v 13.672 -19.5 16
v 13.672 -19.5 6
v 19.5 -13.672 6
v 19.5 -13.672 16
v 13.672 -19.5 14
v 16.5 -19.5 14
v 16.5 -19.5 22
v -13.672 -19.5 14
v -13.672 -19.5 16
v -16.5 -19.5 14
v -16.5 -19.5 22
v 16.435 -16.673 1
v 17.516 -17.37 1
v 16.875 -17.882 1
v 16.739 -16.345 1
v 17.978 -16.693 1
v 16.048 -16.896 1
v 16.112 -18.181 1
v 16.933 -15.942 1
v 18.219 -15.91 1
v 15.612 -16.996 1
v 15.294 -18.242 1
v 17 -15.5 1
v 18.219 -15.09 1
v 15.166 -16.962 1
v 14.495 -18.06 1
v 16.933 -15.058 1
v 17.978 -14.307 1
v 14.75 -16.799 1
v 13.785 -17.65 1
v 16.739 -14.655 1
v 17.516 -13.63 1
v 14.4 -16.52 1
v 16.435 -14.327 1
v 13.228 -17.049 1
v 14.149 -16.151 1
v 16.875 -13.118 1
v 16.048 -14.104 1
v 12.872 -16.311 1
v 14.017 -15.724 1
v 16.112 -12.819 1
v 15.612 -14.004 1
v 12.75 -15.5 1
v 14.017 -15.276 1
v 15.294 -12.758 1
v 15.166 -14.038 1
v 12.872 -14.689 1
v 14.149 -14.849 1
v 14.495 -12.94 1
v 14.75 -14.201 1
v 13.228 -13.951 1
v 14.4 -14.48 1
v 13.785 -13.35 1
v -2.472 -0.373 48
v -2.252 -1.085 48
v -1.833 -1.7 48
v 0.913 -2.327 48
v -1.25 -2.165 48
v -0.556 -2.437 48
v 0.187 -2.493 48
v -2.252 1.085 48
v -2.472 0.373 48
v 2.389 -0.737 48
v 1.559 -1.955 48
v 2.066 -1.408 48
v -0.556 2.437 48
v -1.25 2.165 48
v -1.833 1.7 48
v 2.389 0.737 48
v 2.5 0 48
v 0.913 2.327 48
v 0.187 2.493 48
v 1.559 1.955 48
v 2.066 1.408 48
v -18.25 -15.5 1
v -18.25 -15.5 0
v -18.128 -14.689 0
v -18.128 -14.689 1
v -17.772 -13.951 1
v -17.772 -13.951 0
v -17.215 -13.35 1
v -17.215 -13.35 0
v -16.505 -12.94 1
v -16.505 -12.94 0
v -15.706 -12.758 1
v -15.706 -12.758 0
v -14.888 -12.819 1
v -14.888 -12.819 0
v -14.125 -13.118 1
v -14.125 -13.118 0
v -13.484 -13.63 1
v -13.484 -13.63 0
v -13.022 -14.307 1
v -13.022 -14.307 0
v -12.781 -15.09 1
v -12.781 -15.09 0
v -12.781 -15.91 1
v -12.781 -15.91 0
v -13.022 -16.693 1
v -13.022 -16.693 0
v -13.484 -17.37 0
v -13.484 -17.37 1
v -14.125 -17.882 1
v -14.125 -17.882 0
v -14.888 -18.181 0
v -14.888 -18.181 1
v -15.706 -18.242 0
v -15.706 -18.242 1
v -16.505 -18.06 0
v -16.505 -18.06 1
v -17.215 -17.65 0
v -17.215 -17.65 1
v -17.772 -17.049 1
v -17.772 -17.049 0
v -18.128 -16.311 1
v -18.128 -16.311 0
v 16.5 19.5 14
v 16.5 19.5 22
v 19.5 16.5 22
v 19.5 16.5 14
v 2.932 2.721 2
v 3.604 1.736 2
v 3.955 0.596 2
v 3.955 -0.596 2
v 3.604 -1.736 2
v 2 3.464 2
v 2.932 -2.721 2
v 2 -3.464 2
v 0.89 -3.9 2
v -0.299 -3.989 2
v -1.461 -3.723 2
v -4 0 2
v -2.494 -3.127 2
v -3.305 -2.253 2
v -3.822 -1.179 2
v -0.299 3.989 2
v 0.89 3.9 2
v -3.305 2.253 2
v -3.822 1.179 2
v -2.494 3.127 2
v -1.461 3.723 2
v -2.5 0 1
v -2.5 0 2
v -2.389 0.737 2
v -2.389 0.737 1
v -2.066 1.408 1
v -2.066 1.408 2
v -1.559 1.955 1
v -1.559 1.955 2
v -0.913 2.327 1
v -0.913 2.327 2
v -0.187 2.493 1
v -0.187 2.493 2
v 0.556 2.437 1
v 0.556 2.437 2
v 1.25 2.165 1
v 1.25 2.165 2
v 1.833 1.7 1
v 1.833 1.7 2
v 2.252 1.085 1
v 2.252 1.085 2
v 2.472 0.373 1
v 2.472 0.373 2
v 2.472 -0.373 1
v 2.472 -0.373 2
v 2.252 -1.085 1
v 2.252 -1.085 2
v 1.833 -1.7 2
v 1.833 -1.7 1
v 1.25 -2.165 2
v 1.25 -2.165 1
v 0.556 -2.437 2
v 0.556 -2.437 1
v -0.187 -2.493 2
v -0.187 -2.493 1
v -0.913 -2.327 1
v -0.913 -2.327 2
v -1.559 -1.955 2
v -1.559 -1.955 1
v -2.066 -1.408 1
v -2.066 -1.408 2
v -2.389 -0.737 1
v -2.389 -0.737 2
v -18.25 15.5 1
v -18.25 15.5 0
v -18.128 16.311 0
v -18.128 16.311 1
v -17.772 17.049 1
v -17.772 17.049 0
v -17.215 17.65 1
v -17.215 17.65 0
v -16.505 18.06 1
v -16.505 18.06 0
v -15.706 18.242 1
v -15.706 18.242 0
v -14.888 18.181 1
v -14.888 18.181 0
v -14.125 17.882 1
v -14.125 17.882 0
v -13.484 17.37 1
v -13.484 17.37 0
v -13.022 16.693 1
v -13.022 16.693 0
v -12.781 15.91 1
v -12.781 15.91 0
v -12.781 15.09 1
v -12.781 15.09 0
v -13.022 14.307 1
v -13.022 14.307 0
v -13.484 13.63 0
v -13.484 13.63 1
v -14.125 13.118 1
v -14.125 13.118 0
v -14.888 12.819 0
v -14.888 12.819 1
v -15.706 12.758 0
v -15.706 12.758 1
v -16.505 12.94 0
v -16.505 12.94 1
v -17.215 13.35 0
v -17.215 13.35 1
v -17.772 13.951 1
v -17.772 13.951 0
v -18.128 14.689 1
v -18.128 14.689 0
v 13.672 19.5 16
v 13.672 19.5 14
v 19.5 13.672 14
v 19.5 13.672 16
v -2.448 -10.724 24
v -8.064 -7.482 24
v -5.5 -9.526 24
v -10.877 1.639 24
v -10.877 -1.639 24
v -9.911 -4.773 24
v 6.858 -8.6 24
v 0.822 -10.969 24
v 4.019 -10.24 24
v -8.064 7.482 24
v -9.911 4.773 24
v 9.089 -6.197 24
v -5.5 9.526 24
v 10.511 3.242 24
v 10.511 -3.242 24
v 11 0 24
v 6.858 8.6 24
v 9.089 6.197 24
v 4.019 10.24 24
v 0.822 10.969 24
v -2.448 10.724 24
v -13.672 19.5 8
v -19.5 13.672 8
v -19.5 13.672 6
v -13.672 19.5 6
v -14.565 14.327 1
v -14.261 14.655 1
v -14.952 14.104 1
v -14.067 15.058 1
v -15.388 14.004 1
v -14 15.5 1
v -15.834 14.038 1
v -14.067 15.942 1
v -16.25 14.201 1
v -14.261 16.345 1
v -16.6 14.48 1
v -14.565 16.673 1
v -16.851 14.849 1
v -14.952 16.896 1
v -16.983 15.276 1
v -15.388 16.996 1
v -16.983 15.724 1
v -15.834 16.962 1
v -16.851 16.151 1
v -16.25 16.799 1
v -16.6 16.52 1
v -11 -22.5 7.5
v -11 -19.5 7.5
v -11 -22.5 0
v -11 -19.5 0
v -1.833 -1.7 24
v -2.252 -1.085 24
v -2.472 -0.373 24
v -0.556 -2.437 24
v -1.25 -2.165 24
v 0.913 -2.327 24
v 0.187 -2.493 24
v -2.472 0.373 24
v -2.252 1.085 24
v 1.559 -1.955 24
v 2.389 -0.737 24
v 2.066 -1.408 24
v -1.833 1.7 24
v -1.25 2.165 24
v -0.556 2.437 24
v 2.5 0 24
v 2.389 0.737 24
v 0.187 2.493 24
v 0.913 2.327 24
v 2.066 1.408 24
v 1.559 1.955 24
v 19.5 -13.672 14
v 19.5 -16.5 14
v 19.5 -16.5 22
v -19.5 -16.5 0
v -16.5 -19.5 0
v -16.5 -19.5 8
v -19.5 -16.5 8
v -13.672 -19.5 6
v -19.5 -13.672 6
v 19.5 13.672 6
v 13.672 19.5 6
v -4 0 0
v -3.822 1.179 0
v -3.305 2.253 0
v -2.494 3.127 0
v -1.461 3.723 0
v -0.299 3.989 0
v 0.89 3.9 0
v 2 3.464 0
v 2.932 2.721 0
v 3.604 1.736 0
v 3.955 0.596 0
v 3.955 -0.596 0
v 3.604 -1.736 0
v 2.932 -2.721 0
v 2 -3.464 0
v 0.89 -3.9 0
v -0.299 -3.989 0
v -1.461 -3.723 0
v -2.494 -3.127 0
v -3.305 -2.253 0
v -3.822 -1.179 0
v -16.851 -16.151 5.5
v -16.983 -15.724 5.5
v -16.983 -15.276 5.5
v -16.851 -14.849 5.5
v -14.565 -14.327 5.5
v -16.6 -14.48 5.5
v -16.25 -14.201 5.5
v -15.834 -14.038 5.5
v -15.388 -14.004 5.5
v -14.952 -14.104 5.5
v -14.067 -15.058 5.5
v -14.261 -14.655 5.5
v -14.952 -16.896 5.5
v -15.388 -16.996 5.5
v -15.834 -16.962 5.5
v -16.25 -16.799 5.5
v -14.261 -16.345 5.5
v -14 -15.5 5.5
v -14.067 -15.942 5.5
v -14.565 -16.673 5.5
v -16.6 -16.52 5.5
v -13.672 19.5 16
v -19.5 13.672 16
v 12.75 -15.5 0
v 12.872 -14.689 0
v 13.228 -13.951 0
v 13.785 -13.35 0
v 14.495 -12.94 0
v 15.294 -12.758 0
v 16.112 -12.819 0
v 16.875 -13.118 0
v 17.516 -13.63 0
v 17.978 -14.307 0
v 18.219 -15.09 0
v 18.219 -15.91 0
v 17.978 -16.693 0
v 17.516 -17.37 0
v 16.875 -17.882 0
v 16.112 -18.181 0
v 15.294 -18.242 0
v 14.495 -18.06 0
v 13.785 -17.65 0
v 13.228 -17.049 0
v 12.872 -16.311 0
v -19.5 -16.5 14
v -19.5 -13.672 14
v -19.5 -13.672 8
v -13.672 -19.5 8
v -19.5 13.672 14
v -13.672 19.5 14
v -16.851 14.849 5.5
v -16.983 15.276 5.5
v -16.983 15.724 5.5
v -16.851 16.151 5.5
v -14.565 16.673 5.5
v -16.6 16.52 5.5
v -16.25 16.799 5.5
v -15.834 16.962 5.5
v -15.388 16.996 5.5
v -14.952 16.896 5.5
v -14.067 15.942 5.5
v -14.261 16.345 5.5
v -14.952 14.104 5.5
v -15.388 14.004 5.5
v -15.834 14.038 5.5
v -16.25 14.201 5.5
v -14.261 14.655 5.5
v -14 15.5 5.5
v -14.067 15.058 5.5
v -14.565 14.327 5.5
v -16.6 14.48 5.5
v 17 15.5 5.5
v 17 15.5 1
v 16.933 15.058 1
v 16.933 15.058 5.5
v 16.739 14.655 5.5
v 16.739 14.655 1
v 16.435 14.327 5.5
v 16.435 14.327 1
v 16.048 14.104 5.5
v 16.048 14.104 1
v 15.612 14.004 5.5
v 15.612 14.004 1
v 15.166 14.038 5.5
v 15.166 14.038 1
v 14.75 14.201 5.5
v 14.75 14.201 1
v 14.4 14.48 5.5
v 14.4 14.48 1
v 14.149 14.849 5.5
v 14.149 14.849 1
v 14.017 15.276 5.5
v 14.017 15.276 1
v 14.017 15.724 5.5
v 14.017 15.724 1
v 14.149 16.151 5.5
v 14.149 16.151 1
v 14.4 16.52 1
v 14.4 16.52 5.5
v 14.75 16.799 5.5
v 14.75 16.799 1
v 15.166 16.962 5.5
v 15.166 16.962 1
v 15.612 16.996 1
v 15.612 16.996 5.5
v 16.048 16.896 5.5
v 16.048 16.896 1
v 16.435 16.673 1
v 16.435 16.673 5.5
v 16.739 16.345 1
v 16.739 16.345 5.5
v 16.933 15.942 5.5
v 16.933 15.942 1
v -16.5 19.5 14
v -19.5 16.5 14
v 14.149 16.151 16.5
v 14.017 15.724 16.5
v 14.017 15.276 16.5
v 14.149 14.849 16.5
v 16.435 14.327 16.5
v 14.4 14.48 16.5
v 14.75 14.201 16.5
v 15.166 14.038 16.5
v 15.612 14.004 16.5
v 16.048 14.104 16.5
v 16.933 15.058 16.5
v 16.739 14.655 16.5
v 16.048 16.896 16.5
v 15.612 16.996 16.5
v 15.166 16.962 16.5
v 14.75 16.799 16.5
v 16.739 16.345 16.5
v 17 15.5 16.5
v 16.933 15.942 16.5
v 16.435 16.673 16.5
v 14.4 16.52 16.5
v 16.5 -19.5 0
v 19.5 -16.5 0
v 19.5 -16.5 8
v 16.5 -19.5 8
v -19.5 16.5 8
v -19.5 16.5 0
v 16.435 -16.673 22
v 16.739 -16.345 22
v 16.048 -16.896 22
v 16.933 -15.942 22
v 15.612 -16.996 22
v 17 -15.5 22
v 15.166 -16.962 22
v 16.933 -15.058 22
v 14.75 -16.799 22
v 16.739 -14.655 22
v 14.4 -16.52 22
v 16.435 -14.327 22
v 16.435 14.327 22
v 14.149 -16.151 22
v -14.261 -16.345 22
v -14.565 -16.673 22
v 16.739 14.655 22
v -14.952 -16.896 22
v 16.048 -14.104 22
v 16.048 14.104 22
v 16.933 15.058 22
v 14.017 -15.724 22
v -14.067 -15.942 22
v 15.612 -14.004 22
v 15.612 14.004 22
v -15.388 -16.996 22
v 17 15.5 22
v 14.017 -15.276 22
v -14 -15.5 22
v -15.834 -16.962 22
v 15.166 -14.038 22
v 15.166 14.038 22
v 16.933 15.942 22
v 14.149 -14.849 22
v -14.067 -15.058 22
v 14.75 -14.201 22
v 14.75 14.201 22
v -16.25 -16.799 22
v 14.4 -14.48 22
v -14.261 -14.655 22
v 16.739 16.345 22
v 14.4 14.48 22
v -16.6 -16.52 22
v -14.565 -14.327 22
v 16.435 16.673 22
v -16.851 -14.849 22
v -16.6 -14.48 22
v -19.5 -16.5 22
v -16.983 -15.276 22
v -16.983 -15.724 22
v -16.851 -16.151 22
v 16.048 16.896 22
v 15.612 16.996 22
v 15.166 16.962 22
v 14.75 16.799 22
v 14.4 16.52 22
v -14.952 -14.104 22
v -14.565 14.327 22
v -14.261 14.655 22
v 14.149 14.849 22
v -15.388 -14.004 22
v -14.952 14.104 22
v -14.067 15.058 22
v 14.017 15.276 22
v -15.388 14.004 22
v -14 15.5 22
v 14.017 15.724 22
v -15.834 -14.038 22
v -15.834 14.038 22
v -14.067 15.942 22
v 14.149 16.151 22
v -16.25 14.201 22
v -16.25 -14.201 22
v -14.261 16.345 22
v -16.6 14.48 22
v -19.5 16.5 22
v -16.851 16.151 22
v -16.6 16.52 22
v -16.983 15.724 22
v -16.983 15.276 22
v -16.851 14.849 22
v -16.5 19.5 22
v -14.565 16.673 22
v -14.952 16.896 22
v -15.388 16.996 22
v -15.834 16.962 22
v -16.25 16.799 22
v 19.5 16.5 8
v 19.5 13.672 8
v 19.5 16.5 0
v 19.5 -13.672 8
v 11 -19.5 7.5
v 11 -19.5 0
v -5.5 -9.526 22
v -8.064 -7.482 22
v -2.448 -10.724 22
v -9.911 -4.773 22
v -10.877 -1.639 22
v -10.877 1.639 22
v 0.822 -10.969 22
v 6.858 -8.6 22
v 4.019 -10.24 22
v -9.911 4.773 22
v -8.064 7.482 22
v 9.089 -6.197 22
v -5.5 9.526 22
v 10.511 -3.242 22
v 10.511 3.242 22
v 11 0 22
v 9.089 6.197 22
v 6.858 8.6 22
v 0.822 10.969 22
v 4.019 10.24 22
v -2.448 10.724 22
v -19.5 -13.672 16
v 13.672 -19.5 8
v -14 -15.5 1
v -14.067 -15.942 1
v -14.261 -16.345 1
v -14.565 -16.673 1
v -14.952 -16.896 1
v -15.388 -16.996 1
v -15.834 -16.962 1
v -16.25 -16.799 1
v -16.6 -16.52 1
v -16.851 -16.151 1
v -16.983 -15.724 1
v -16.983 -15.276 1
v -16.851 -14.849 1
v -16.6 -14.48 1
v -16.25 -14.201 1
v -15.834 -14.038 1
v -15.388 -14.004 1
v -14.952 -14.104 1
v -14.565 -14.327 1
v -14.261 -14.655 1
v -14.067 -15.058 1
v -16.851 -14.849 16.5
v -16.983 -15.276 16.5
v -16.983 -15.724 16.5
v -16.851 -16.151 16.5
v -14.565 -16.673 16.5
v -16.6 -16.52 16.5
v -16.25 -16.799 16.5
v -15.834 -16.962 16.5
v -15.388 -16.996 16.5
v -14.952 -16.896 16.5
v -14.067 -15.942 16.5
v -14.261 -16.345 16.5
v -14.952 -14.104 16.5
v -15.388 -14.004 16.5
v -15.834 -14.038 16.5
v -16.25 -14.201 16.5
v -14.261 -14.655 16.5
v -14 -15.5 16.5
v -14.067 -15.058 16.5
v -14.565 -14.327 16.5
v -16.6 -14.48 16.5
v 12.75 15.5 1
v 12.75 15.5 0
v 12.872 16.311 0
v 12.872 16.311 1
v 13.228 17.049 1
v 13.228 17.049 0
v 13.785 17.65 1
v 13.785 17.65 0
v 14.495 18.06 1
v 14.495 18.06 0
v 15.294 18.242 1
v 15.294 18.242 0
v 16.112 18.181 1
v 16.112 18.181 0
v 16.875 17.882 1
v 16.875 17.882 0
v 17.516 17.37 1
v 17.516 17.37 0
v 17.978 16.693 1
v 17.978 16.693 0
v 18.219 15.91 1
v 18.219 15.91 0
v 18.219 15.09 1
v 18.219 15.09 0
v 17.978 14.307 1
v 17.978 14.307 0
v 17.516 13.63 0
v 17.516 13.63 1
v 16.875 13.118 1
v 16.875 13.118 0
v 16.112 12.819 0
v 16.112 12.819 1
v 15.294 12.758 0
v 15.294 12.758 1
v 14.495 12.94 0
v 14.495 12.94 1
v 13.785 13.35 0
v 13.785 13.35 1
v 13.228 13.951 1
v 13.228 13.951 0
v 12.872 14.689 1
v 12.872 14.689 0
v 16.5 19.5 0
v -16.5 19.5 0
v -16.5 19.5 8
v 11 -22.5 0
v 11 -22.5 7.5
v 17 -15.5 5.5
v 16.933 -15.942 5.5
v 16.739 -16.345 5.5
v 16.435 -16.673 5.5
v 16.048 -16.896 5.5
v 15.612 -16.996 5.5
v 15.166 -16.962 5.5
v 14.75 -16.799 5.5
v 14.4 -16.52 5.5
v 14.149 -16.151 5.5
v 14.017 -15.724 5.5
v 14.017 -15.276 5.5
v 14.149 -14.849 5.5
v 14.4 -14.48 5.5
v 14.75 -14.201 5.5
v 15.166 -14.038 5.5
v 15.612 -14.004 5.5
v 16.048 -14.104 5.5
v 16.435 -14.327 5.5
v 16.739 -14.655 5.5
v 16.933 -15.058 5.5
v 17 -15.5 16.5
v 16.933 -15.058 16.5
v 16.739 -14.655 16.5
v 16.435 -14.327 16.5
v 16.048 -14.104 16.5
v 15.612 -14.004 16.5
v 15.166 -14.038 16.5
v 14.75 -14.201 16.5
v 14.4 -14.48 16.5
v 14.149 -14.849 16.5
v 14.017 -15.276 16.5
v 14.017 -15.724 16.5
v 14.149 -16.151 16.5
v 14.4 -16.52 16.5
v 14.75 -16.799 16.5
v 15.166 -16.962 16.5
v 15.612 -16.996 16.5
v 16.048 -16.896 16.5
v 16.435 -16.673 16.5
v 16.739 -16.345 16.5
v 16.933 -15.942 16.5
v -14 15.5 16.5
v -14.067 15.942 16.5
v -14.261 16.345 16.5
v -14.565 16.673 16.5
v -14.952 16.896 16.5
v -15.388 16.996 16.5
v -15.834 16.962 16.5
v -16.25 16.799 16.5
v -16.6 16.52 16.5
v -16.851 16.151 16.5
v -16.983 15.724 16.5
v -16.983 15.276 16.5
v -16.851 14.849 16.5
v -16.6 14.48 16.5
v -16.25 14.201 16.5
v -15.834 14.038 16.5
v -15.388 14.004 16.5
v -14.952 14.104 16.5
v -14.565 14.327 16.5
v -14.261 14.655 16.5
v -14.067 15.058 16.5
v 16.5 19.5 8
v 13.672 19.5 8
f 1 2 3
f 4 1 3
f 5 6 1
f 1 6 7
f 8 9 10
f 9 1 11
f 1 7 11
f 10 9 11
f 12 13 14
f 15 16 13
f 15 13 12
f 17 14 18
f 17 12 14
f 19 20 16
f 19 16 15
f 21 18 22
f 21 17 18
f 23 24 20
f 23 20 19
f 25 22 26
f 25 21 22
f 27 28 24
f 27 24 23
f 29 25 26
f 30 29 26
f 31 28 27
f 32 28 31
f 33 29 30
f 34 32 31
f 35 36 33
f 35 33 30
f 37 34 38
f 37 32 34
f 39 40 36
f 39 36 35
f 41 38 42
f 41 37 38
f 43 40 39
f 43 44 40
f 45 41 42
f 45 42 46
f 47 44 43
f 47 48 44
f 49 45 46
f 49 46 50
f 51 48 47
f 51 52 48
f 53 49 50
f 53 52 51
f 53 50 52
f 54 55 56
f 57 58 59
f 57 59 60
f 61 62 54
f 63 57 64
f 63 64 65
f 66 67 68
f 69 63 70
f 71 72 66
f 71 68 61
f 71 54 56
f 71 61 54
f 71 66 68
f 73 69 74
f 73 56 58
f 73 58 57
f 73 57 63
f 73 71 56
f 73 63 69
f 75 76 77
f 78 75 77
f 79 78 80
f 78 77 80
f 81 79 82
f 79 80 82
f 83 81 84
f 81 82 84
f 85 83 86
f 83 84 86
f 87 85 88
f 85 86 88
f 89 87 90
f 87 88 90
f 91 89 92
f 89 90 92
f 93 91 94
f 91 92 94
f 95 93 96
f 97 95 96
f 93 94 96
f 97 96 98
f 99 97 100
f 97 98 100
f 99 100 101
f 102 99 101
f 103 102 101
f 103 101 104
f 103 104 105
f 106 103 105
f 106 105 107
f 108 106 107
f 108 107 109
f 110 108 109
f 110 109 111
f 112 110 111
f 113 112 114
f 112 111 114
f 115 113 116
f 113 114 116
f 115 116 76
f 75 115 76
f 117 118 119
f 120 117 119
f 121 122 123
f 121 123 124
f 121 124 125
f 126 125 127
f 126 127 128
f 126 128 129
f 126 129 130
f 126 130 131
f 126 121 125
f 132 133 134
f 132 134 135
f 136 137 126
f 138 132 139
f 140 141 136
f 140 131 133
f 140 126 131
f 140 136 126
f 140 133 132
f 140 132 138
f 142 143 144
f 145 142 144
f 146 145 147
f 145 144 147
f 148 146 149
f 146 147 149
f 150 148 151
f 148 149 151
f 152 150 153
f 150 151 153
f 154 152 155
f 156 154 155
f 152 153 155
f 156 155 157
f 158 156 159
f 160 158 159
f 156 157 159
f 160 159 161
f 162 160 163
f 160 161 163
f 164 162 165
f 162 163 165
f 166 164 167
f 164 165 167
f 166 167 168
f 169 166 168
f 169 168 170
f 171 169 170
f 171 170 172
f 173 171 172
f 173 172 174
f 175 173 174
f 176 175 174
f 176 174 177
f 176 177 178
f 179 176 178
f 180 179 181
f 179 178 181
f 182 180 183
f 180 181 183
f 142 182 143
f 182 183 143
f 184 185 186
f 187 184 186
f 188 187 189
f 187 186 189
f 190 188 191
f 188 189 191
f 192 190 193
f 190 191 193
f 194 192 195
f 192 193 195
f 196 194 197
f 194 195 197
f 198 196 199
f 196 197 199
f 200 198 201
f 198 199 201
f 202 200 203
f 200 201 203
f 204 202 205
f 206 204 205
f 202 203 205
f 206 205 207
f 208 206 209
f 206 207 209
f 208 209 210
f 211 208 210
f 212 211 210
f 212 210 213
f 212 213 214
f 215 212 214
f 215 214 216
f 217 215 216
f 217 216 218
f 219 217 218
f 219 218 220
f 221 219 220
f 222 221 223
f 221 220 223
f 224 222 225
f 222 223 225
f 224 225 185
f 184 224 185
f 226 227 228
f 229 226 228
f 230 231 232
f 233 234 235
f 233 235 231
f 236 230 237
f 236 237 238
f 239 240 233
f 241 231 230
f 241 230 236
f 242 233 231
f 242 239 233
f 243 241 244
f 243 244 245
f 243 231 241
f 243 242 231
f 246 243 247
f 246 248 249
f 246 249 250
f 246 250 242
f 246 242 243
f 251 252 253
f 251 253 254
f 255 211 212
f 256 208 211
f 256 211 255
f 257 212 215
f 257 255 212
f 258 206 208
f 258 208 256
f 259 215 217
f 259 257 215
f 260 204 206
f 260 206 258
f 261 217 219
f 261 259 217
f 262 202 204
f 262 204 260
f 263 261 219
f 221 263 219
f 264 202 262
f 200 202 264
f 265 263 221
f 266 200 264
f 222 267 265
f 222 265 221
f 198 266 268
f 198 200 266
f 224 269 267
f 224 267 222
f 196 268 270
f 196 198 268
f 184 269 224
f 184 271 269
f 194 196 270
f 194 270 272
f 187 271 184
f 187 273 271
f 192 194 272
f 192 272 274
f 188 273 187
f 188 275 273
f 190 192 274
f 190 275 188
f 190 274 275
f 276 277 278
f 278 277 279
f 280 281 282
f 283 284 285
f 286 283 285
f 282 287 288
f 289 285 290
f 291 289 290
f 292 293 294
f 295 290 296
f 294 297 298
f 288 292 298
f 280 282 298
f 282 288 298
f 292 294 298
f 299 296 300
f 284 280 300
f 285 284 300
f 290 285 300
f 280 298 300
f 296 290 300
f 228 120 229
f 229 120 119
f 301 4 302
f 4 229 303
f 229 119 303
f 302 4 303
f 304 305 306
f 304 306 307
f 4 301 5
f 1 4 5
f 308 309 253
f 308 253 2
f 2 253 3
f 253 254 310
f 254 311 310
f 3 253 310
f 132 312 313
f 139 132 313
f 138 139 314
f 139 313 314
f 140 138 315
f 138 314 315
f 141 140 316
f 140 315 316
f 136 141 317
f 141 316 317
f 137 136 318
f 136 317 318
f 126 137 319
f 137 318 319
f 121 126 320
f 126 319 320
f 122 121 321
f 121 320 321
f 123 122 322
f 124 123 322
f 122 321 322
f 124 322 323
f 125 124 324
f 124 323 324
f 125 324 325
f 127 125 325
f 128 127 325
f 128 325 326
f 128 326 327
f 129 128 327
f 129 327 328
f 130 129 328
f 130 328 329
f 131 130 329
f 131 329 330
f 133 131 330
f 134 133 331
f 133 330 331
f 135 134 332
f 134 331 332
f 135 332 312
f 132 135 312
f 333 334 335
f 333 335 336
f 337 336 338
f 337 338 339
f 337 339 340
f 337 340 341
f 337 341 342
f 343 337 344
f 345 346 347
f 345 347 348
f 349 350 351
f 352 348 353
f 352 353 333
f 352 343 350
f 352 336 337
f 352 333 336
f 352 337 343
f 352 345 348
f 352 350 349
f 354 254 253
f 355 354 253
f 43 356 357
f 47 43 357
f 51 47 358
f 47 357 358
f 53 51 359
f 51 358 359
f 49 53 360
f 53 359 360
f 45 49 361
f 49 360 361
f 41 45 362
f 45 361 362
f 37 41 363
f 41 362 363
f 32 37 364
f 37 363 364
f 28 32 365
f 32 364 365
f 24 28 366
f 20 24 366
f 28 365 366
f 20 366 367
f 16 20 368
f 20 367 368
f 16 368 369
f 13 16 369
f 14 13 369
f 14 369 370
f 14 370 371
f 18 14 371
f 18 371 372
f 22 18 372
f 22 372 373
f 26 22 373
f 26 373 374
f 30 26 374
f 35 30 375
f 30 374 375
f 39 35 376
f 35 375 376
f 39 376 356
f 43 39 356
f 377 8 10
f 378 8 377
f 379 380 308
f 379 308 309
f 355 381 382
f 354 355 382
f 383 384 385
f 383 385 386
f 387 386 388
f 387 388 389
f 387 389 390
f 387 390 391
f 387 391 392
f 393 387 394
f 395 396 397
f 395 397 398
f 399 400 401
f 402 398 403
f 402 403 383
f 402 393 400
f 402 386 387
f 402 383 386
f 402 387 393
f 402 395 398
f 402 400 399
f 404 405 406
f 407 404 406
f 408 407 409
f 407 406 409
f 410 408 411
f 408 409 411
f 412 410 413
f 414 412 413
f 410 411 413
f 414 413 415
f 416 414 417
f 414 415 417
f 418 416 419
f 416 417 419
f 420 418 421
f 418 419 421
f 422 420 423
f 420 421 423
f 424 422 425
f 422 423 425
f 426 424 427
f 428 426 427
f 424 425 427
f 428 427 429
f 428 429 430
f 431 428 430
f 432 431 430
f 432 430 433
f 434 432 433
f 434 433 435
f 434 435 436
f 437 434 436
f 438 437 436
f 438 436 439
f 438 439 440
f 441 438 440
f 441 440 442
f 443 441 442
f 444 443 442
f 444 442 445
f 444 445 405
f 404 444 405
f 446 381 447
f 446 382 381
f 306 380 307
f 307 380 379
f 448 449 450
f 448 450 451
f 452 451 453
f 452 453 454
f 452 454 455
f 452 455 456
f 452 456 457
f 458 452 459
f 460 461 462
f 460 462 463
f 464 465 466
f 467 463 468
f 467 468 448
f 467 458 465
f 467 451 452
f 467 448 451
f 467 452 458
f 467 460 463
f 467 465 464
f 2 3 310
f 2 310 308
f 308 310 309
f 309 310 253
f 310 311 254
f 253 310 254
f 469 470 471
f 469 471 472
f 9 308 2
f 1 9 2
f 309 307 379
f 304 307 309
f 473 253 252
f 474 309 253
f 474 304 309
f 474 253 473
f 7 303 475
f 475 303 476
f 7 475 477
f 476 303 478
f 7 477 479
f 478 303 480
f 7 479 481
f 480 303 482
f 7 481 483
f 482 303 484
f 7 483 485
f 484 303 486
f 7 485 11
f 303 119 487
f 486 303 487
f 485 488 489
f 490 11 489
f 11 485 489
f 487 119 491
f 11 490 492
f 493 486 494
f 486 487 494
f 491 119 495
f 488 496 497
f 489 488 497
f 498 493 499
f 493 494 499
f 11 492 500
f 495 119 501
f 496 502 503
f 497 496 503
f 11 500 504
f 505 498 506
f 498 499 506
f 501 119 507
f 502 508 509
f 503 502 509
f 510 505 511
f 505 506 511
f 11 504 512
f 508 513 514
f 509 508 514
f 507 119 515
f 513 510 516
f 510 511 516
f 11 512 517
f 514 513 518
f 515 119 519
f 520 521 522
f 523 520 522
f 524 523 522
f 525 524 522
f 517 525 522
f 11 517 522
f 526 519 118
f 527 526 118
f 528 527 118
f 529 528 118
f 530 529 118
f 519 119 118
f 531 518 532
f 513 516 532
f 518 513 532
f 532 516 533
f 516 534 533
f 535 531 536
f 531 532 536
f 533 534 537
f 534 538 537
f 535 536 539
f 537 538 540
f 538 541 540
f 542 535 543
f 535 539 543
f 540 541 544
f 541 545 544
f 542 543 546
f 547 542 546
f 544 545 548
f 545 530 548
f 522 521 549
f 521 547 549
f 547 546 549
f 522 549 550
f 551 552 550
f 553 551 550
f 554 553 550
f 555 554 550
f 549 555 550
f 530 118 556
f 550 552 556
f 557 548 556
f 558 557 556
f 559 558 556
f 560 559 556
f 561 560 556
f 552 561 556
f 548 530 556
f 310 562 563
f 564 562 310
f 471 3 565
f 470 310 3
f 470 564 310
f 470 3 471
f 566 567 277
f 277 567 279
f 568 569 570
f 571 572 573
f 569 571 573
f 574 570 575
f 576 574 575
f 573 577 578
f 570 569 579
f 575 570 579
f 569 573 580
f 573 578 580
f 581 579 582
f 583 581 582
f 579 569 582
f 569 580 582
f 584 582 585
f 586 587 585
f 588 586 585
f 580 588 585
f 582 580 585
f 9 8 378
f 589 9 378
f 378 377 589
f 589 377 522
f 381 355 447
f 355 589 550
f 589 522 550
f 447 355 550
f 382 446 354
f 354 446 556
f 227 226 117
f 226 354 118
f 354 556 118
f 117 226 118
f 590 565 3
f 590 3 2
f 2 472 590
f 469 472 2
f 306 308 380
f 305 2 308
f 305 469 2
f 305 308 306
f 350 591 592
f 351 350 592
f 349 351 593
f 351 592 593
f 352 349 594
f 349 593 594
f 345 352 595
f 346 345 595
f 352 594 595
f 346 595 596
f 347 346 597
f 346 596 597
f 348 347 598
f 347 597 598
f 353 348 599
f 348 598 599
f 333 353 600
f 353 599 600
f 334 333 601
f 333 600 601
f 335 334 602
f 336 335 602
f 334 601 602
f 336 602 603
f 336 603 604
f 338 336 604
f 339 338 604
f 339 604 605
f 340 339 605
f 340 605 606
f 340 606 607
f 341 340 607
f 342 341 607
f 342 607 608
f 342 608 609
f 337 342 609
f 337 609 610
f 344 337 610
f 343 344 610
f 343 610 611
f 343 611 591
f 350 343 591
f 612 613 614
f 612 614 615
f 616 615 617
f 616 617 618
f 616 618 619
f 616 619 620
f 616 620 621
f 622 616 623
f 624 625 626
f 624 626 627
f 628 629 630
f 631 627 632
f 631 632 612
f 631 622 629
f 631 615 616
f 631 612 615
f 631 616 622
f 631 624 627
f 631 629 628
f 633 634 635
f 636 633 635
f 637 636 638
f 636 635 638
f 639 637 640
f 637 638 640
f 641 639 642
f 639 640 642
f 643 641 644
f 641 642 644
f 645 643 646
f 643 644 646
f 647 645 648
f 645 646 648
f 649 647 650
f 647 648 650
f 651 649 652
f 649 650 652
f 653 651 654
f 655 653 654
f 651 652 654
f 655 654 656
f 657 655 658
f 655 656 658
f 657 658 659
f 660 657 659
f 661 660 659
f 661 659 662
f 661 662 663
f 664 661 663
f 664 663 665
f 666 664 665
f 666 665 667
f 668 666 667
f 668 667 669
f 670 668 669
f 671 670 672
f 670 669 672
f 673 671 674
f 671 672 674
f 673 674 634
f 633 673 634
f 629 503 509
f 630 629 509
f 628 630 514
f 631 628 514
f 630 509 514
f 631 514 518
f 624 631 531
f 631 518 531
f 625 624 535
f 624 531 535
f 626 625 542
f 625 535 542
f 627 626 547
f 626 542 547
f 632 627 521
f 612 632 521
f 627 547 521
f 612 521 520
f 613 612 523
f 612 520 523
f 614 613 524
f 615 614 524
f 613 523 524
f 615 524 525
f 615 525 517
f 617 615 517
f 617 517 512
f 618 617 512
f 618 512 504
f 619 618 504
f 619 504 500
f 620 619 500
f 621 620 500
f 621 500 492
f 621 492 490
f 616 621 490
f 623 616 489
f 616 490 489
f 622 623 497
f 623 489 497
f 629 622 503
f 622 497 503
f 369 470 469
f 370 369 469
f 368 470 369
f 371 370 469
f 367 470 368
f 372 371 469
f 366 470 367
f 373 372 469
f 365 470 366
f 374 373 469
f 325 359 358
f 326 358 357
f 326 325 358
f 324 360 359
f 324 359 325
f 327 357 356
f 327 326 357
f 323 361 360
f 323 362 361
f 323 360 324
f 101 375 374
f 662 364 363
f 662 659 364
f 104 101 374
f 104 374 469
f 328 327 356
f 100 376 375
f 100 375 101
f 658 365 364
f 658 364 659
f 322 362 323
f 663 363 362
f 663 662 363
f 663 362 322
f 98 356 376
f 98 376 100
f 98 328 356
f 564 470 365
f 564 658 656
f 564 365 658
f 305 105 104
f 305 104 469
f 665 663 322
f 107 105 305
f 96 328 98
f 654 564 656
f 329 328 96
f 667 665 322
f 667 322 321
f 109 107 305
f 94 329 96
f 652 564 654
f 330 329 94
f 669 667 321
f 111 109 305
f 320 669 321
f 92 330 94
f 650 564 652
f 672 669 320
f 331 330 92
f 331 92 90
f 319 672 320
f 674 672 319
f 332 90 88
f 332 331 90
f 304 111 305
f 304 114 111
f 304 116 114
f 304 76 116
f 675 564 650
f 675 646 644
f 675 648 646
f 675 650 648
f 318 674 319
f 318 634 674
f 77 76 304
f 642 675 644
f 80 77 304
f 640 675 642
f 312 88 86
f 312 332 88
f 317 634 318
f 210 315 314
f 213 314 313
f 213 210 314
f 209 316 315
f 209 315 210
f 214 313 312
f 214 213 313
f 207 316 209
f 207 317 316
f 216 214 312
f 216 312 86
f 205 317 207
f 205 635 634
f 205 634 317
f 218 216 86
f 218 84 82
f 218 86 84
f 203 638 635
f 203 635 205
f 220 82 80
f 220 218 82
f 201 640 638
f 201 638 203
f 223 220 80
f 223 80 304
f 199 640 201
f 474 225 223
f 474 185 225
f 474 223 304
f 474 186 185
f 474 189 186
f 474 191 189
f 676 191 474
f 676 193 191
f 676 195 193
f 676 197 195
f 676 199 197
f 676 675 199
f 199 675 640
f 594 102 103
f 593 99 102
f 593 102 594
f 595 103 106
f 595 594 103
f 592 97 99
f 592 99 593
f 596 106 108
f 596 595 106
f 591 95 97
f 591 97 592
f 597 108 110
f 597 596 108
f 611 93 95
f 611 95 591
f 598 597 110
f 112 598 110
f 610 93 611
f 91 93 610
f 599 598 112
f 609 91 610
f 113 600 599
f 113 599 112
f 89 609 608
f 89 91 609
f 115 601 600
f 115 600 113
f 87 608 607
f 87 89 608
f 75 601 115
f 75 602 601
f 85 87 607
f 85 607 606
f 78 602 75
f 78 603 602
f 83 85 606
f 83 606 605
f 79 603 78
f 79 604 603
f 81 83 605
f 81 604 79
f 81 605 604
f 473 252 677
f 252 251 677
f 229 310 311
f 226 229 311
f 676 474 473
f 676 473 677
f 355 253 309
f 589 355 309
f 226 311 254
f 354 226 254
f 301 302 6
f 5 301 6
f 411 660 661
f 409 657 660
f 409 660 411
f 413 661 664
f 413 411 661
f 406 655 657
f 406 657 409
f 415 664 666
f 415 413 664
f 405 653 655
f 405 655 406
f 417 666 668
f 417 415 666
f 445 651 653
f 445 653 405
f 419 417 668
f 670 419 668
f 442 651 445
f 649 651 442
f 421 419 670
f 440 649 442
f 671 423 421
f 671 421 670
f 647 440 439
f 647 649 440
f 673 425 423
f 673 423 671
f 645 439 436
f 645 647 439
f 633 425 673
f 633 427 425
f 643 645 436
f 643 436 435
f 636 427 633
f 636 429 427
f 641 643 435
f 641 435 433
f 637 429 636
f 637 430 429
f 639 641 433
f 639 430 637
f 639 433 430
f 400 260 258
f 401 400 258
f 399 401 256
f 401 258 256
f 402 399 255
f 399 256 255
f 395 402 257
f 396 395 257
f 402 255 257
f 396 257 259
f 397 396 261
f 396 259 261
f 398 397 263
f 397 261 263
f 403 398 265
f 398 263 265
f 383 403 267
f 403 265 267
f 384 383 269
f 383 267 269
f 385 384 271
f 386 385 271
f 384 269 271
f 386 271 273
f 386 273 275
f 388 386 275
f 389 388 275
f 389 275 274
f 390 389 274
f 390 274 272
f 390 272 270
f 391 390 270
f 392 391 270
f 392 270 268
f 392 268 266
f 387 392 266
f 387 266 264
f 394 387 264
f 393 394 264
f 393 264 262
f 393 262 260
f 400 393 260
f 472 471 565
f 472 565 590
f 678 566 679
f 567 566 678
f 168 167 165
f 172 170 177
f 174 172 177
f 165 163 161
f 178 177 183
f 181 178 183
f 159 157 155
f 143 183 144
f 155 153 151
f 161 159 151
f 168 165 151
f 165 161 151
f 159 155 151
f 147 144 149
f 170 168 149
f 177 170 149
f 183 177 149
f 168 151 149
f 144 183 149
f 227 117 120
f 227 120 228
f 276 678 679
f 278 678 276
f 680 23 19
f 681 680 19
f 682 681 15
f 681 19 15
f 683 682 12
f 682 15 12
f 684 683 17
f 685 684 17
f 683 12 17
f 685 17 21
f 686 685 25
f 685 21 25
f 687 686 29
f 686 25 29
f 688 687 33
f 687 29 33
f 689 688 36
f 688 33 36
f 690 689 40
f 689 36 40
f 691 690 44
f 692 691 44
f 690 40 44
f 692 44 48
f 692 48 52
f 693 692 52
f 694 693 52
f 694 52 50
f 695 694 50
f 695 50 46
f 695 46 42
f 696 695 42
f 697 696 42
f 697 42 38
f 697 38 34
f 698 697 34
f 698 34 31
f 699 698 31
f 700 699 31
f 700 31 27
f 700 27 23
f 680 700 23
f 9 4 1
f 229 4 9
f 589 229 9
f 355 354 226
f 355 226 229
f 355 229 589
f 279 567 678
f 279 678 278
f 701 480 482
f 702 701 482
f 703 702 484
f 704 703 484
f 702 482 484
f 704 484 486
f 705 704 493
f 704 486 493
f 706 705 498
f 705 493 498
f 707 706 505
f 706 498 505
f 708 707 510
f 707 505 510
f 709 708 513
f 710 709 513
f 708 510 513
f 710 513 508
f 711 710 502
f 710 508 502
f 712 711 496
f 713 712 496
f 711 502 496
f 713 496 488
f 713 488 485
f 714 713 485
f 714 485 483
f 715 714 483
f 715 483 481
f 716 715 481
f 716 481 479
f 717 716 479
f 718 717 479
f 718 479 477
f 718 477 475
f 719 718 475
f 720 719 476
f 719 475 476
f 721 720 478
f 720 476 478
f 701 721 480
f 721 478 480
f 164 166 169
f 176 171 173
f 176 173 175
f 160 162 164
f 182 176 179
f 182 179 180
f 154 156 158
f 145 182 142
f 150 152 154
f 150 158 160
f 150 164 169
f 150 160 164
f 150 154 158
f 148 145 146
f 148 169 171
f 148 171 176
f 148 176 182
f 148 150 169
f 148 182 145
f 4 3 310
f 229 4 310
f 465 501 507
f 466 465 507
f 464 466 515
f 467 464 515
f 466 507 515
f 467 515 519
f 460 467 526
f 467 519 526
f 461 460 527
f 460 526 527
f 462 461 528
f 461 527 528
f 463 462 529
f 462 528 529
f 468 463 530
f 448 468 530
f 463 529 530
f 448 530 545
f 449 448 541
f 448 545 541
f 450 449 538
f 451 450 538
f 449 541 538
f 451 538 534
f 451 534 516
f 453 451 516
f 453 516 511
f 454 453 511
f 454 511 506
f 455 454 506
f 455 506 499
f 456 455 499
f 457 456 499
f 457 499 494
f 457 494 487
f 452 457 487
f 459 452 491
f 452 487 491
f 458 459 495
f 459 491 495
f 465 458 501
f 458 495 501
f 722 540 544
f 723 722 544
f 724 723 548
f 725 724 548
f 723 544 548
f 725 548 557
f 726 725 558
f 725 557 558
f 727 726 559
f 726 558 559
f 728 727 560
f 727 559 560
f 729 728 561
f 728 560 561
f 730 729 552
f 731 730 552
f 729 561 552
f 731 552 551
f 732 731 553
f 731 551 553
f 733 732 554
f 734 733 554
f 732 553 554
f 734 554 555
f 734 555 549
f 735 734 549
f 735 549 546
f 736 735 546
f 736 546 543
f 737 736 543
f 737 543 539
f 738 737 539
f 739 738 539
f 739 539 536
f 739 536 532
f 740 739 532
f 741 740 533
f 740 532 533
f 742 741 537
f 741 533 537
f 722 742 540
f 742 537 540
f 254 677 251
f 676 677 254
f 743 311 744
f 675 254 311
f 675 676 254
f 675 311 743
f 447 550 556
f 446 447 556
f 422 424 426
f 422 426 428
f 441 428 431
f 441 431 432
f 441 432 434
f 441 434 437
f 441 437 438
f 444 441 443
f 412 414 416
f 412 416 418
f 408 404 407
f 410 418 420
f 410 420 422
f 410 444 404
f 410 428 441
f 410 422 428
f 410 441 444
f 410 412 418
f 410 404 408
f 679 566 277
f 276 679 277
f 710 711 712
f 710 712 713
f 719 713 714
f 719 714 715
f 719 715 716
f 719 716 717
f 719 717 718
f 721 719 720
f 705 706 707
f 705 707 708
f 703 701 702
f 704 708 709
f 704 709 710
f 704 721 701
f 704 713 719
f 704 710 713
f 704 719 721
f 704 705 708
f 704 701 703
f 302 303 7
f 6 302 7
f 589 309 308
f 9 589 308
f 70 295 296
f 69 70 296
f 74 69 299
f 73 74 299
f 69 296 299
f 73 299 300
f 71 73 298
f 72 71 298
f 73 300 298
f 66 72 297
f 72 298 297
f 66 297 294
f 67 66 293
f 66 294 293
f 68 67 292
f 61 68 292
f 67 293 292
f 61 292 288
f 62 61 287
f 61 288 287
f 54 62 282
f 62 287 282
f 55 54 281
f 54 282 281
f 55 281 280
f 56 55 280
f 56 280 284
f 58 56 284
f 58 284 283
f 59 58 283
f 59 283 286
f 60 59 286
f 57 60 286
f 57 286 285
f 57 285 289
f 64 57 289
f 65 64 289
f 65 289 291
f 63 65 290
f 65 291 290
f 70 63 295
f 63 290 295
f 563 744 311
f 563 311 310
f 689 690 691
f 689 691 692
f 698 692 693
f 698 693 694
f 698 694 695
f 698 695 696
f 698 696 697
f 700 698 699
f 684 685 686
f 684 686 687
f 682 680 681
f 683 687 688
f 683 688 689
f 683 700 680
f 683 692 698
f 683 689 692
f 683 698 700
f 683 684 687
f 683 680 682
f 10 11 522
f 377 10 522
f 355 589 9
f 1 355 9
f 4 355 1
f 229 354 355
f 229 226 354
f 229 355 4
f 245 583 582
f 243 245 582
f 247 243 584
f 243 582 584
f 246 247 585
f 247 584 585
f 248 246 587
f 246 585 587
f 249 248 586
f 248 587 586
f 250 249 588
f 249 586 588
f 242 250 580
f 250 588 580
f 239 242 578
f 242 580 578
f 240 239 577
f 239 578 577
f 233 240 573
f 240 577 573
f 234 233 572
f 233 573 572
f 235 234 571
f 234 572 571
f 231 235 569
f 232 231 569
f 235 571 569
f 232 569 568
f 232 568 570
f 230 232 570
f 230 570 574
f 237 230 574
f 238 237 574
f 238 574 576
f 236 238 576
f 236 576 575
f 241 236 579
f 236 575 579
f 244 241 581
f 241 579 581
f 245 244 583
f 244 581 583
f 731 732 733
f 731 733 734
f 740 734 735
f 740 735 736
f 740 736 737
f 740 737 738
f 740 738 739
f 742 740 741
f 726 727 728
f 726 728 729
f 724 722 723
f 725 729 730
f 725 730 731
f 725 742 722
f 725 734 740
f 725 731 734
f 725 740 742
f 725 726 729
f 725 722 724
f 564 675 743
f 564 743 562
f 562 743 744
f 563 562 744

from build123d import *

# Parameters (mm, degrees)
BOSS_EXTRUDE1_DEPTH  = 8
CUT_EXTRUDE1_DEPTH   = 2
BOSS_EXTRUDE7_DEPTH  = 8
EXTRUDE_3_DEPTH      = 10
CUT_EXTRUDE2_DEPTH   = 2
SKETCH10_R           = 1.5
CUT_EXTRUDE3_DEPTH   = 5.5
SKETCH11_R           = 11
BOSS_EXTRUDE9_DEPTH  = 2
SKETCH12_R           = 2.5
BOSS_EXTRUDE10_DEPTH = 24
SKETCH14_R           = 1.5
CUT_EXTRUDE5_DEPTH   = 5.5
SKETCH16_R           = 4
CUT_EXTRUDE6_DEPTH   = 2
SKETCH17_R           = 2.5
BOSS_EXTRUDE11_DEPTH = 1
SKETCH18_R           = 2.75
CUT_EXTRUDE7_DEPTH   = 1
SKETCH_3_W           = 22
SKETCH_3_H           = 7.5
EXTRUDE_4_DEPTH      = 3


with BuildPart() as part:
    # Sketch1 → Boss-Extrude1 (new body)
    with BuildSketch(Plane.XY):
        Polygon((-19.5, 16.5), (-16.5, 19.5), (16.5, 19.5), (19.5, 16.5), (19.5, -16.5), (16.5, -19.5), (-16.5, -19.5), (-19.5, -16.5), align=None)
    extrude(amount=BOSS_EXTRUDE1_DEPTH)

    # Sketch2 → Cut-Extrude1 (cut)
    with BuildSketch(Plane.XY.offset(8)):
        Polygon((-19.5, 13.671572875), (-13.671572875, 19.5), (13.671572875, 19.5), (19.5, 13.671572875), (19.5, -13.671572875), (13.671572875, -19.5), (-13.671572875, -19.5), (-19.5, -13.671572875), align=None)
    extrude(amount=-CUT_EXTRUDE1_DEPTH, mode=Mode.SUBTRACT)

    # Sketch14 → Cut-Extrude5 (cut)
    with BuildSketch(Plane(origin=(0, 0, 0), x_dir=(-1, 0, 0), z_dir=(0, 0, -1))):
        with Locations(Location((15.5, -15.5, 0), (0, 0, 180))):
            Circle(SKETCH14_R)
        with Locations(Location((-15.5, -15.5, 0), (0, 0, 180))):
            Circle(SKETCH14_R)
        with Locations(Location((-15.5, 15.5, 0), (0, 0, 180))):
            Circle(SKETCH14_R)
        with Locations(Location((15.5, 15.5, 0), (0, 0, 180))):
            Circle(SKETCH14_R)
    extrude(amount=-CUT_EXTRUDE5_DEPTH, mode=Mode.SUBTRACT)

    # Sketch16 → Cut-Extrude6 (cut)
    with BuildSketch(Plane(origin=(0, 0, 0), x_dir=(-1, 0, 0), z_dir=(0, 0, -1))):
        Circle(SKETCH16_R)
    extrude(amount=-CUT_EXTRUDE6_DEPTH, mode=Mode.SUBTRACT)

    # Sketch18 → Cut-Extrude7 (cut)
    with BuildSketch(Plane(origin=(0, 0, 0), x_dir=(-1, 0, 0), z_dir=(0, 0, -1))):
        with Locations((15.5, -15.5)):
            Circle(SKETCH18_R)
        with Locations((-15.5, -15.5)):
            Circle(SKETCH18_R)
        with Locations((-15.5, 15.5)):
            Circle(SKETCH18_R)
        with Locations((15.5, 15.5)):
            Circle(SKETCH18_R)
    extrude(amount=-CUT_EXTRUDE7_DEPTH, mode=Mode.SUBTRACT)


with BuildPart() as body_2:
    # Sketch8 → Boss-Extrude7 (new body)
    with BuildSketch(Plane(origin=(0, 0, 22), x_dir=(-1, 0, 0), z_dir=(0, 0, -1))):
        Polygon((19.5, 16.5), (16.5, 19.5), (-16.5, 19.5), (-19.5, 16.5), (-19.5, -16.5), (-16.5, -19.5), (16.5, -19.5), (19.5, -16.5), align=None)
    extrude(amount=BOSS_EXTRUDE7_DEPTH)

    # Sketch9 → Cut-Extrude2 (cut)
    with BuildSketch(Plane(origin=(0, 0, 14), x_dir=(-1, 0, 0), z_dir=(0, 0, -1))):
        Polygon((13.671572875, -19.5), (19.5, -13.671572875), (19.5, 13.671572875), (13.671572875, 19.5), (-13.671572875, 19.5), (-19.5, 13.671572875), (-19.5, -13.671572875), (-13.671572875, -19.5), align=None)
    extrude(amount=-CUT_EXTRUDE2_DEPTH, mode=Mode.SUBTRACT)

    # Sketch10 → Cut-Extrude3 (cut)
    with BuildSketch(Plane.XY.offset(22)):
        with Locations((-15.5, 15.5)):
            Circle(SKETCH10_R)
        with Locations((15.5, 15.5)):
            Circle(SKETCH10_R)
        with Locations((15.5, -15.5)):
            Circle(SKETCH10_R)
        with Locations((-15.5, -15.5)):
            Circle(SKETCH10_R)
    extrude(amount=-CUT_EXTRUDE3_DEPTH, mode=Mode.SUBTRACT)


with BuildPart() as body_3:
    # 草图4 → 凸台-拉伸3 (new body)
    with BuildSketch(Plane.XY.offset(6)):
        Polygon((-13.671572875, 19.5), (-19.5, 13.671572875), (-19.5, -13.671572875), (-13.671572875, -19.5), (13.671572875, -19.5), (19.5, -13.671572875), (19.5, 13.671572875), (13.671572875, 19.5), align=None)
    extrude(amount=EXTRUDE_3_DEPTH)


with BuildPart() as body_4:
    # Sketch11 → Boss-Extrude9 (new body)
    with BuildSketch(Plane.XY.offset(22)):
        Circle(SKETCH11_R)
    extrude(amount=BOSS_EXTRUDE9_DEPTH)


with BuildPart() as body_5:
    # Sketch12 → Boss-Extrude10 (new body)
    with BuildSketch(Plane.XY.offset(24)):
        Circle(SKETCH12_R)
    extrude(amount=BOSS_EXTRUDE10_DEPTH)


with BuildPart() as body_6:
    # Sketch17 → Boss-Extrude11 (new body)
    with BuildSketch(Plane(origin=(0, 0, 2), x_dir=(-1, 0, 0), z_dir=(0, 0, -1))):
        Circle(SKETCH17_R)
    extrude(amount=BOSS_EXTRUDE11_DEPTH)


with BuildPart() as body_7:
    # 草图3 → 凸台-拉伸4 (new body)
    with BuildSketch(Plane(origin=(0, -19.5, 0), x_dir=(-1, 0, 0), z_dir=(0, -1, 0))):
        with Locations((0, -3.75)):
            Rectangle(SKETCH_3_W, SKETCH_3_H)
    extrude(amount=EXTRUDE_4_DEPTH)


solid = Compound([part.part, body_2.part, body_3.part, body_4.part, body_5.part, body_6.part, body_7.part])
